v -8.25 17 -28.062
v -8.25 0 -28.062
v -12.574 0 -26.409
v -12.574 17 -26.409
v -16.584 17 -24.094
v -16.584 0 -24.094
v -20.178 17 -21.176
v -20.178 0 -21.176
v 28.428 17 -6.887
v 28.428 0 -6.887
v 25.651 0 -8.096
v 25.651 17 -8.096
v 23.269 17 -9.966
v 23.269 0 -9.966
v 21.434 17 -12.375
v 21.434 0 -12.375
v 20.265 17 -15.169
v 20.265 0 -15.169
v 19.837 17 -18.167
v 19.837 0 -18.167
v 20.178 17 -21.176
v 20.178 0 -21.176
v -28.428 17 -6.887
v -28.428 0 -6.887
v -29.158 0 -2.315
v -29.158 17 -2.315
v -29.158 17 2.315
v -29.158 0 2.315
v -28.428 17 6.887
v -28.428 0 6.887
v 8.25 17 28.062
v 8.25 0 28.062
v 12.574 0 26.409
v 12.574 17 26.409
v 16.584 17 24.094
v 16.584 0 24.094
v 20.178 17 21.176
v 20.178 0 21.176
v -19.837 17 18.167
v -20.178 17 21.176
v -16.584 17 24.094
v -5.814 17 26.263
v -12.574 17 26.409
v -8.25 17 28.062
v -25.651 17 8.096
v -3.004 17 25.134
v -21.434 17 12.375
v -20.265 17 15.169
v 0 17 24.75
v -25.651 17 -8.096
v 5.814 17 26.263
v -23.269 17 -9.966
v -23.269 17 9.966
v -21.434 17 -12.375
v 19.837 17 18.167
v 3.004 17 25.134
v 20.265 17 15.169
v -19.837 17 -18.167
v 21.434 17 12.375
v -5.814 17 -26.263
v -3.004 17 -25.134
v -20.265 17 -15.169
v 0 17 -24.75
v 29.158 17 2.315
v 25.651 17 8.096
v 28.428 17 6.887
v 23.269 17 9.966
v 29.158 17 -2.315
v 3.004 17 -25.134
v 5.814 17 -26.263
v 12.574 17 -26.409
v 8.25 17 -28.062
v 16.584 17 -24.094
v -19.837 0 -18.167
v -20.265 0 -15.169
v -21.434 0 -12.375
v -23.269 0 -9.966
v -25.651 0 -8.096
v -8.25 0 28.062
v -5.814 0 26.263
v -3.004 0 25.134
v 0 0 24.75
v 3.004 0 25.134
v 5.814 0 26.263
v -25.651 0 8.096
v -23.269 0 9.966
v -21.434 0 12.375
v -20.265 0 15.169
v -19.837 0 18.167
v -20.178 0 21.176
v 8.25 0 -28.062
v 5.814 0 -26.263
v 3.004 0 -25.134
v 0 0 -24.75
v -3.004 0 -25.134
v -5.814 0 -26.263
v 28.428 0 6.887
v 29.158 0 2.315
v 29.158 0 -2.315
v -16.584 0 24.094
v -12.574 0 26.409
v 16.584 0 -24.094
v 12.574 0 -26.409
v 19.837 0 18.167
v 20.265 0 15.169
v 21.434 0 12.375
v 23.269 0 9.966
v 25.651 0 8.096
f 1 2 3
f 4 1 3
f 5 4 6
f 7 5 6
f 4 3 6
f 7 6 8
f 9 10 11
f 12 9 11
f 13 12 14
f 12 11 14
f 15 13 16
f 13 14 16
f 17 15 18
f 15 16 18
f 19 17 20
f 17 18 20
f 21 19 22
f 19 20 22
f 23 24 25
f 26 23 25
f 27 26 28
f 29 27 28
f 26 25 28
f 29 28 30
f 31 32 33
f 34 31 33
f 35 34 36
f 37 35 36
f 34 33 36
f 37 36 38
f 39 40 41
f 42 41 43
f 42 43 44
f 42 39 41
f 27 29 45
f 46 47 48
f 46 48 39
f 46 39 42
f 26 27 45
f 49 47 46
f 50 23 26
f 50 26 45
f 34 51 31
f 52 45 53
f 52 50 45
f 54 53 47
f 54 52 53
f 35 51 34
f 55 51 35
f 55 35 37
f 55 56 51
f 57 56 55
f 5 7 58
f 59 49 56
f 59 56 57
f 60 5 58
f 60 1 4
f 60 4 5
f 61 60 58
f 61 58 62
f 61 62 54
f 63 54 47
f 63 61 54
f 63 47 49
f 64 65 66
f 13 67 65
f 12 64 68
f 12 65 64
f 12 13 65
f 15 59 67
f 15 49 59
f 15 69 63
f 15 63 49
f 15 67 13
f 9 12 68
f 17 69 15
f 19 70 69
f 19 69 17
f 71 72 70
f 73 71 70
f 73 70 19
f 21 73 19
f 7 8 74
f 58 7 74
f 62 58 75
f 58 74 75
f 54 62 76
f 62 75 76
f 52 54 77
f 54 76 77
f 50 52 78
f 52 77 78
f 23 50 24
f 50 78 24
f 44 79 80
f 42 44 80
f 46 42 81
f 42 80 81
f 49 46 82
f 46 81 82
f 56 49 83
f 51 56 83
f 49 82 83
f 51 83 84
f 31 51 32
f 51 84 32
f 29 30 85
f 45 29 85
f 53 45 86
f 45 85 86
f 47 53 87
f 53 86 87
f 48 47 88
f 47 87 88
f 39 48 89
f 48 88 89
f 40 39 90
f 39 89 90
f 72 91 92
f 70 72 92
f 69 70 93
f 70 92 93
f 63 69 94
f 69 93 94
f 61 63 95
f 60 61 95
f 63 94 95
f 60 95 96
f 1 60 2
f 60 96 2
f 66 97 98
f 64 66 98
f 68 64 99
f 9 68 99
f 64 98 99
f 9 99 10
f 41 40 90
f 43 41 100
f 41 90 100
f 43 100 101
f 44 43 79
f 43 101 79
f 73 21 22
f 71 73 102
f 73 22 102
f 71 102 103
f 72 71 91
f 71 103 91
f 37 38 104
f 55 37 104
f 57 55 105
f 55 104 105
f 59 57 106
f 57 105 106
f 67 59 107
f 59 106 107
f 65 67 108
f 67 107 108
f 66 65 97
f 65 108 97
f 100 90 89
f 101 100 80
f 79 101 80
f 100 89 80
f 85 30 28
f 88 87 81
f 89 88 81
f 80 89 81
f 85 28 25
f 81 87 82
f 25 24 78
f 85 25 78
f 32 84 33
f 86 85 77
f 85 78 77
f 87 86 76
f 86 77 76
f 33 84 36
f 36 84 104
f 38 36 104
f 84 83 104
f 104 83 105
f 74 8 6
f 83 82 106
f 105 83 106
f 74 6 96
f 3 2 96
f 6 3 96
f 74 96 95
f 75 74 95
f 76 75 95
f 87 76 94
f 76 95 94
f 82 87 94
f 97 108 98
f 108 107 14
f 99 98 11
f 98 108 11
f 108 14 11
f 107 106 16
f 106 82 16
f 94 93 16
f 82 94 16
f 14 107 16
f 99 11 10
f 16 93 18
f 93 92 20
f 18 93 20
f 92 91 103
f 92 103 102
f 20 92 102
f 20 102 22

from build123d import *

# Parameters (mm, degrees)
SALIENTE_EXTRUIR1_DEPTH = 17


with BuildPart() as part:
    # Croquis1 → Saliente-Extruir1 (new body)
    with BuildSketch(Plane(origin=(0, 0, 0), x_dir=(1, 0, 0), z_dir=(0, 1, 0))):
        with BuildLine():
            ThreePointArc((8.25, -28.062430401), (14.625, -25.331243061), (20.177777619, -21.175924782))
            ThreePointArc((20.177777619, -21.175924782), (21.434128744, -12.375), (28.427777619, -6.886505619))
            ThreePointArc((28.427777619, -6.886505619), (29.25, 0), (28.427777619, 6.886505619))
            ThreePointArc((28.427777619, 6.886505619), (21.434128744, 12.375), (20.177777619, 21.175924782))
            ThreePointArc((20.177777619, 21.175924782), (14.625, 25.331243061), (8.25, 28.062430401))
            ThreePointArc((8.25, 28.062430401), (0, 24.75), (-8.25, 28.062430401))
            ThreePointArc((-8.25, 28.062430401), (-14.625, 25.331243061), (-20.177777619, 21.175924782))
            ThreePointArc((-20.177777619, 21.175924782), (-21.434128744, 12.375), (-28.427777619, 6.886505619))
            ThreePointArc((-28.427777619, 6.886505619), (-29.25, 0), (-28.427777619, -6.886505619))
            ThreePointArc((-28.427777619, -6.886505619), (-21.434128744, -12.375), (-20.177777619, -21.175924782))
            ThreePointArc((-20.177777619, -21.175924782), (-14.625, -25.331243061), (-8.25, -28.062430401))
            ThreePointArc((-8.25, -28.062430401), (0, -24.75), (8.25, -28.062430401))
        make_face()
    extrude(amount=SALIENTE_EXTRUIR1_DEPTH)


solid = part.part
